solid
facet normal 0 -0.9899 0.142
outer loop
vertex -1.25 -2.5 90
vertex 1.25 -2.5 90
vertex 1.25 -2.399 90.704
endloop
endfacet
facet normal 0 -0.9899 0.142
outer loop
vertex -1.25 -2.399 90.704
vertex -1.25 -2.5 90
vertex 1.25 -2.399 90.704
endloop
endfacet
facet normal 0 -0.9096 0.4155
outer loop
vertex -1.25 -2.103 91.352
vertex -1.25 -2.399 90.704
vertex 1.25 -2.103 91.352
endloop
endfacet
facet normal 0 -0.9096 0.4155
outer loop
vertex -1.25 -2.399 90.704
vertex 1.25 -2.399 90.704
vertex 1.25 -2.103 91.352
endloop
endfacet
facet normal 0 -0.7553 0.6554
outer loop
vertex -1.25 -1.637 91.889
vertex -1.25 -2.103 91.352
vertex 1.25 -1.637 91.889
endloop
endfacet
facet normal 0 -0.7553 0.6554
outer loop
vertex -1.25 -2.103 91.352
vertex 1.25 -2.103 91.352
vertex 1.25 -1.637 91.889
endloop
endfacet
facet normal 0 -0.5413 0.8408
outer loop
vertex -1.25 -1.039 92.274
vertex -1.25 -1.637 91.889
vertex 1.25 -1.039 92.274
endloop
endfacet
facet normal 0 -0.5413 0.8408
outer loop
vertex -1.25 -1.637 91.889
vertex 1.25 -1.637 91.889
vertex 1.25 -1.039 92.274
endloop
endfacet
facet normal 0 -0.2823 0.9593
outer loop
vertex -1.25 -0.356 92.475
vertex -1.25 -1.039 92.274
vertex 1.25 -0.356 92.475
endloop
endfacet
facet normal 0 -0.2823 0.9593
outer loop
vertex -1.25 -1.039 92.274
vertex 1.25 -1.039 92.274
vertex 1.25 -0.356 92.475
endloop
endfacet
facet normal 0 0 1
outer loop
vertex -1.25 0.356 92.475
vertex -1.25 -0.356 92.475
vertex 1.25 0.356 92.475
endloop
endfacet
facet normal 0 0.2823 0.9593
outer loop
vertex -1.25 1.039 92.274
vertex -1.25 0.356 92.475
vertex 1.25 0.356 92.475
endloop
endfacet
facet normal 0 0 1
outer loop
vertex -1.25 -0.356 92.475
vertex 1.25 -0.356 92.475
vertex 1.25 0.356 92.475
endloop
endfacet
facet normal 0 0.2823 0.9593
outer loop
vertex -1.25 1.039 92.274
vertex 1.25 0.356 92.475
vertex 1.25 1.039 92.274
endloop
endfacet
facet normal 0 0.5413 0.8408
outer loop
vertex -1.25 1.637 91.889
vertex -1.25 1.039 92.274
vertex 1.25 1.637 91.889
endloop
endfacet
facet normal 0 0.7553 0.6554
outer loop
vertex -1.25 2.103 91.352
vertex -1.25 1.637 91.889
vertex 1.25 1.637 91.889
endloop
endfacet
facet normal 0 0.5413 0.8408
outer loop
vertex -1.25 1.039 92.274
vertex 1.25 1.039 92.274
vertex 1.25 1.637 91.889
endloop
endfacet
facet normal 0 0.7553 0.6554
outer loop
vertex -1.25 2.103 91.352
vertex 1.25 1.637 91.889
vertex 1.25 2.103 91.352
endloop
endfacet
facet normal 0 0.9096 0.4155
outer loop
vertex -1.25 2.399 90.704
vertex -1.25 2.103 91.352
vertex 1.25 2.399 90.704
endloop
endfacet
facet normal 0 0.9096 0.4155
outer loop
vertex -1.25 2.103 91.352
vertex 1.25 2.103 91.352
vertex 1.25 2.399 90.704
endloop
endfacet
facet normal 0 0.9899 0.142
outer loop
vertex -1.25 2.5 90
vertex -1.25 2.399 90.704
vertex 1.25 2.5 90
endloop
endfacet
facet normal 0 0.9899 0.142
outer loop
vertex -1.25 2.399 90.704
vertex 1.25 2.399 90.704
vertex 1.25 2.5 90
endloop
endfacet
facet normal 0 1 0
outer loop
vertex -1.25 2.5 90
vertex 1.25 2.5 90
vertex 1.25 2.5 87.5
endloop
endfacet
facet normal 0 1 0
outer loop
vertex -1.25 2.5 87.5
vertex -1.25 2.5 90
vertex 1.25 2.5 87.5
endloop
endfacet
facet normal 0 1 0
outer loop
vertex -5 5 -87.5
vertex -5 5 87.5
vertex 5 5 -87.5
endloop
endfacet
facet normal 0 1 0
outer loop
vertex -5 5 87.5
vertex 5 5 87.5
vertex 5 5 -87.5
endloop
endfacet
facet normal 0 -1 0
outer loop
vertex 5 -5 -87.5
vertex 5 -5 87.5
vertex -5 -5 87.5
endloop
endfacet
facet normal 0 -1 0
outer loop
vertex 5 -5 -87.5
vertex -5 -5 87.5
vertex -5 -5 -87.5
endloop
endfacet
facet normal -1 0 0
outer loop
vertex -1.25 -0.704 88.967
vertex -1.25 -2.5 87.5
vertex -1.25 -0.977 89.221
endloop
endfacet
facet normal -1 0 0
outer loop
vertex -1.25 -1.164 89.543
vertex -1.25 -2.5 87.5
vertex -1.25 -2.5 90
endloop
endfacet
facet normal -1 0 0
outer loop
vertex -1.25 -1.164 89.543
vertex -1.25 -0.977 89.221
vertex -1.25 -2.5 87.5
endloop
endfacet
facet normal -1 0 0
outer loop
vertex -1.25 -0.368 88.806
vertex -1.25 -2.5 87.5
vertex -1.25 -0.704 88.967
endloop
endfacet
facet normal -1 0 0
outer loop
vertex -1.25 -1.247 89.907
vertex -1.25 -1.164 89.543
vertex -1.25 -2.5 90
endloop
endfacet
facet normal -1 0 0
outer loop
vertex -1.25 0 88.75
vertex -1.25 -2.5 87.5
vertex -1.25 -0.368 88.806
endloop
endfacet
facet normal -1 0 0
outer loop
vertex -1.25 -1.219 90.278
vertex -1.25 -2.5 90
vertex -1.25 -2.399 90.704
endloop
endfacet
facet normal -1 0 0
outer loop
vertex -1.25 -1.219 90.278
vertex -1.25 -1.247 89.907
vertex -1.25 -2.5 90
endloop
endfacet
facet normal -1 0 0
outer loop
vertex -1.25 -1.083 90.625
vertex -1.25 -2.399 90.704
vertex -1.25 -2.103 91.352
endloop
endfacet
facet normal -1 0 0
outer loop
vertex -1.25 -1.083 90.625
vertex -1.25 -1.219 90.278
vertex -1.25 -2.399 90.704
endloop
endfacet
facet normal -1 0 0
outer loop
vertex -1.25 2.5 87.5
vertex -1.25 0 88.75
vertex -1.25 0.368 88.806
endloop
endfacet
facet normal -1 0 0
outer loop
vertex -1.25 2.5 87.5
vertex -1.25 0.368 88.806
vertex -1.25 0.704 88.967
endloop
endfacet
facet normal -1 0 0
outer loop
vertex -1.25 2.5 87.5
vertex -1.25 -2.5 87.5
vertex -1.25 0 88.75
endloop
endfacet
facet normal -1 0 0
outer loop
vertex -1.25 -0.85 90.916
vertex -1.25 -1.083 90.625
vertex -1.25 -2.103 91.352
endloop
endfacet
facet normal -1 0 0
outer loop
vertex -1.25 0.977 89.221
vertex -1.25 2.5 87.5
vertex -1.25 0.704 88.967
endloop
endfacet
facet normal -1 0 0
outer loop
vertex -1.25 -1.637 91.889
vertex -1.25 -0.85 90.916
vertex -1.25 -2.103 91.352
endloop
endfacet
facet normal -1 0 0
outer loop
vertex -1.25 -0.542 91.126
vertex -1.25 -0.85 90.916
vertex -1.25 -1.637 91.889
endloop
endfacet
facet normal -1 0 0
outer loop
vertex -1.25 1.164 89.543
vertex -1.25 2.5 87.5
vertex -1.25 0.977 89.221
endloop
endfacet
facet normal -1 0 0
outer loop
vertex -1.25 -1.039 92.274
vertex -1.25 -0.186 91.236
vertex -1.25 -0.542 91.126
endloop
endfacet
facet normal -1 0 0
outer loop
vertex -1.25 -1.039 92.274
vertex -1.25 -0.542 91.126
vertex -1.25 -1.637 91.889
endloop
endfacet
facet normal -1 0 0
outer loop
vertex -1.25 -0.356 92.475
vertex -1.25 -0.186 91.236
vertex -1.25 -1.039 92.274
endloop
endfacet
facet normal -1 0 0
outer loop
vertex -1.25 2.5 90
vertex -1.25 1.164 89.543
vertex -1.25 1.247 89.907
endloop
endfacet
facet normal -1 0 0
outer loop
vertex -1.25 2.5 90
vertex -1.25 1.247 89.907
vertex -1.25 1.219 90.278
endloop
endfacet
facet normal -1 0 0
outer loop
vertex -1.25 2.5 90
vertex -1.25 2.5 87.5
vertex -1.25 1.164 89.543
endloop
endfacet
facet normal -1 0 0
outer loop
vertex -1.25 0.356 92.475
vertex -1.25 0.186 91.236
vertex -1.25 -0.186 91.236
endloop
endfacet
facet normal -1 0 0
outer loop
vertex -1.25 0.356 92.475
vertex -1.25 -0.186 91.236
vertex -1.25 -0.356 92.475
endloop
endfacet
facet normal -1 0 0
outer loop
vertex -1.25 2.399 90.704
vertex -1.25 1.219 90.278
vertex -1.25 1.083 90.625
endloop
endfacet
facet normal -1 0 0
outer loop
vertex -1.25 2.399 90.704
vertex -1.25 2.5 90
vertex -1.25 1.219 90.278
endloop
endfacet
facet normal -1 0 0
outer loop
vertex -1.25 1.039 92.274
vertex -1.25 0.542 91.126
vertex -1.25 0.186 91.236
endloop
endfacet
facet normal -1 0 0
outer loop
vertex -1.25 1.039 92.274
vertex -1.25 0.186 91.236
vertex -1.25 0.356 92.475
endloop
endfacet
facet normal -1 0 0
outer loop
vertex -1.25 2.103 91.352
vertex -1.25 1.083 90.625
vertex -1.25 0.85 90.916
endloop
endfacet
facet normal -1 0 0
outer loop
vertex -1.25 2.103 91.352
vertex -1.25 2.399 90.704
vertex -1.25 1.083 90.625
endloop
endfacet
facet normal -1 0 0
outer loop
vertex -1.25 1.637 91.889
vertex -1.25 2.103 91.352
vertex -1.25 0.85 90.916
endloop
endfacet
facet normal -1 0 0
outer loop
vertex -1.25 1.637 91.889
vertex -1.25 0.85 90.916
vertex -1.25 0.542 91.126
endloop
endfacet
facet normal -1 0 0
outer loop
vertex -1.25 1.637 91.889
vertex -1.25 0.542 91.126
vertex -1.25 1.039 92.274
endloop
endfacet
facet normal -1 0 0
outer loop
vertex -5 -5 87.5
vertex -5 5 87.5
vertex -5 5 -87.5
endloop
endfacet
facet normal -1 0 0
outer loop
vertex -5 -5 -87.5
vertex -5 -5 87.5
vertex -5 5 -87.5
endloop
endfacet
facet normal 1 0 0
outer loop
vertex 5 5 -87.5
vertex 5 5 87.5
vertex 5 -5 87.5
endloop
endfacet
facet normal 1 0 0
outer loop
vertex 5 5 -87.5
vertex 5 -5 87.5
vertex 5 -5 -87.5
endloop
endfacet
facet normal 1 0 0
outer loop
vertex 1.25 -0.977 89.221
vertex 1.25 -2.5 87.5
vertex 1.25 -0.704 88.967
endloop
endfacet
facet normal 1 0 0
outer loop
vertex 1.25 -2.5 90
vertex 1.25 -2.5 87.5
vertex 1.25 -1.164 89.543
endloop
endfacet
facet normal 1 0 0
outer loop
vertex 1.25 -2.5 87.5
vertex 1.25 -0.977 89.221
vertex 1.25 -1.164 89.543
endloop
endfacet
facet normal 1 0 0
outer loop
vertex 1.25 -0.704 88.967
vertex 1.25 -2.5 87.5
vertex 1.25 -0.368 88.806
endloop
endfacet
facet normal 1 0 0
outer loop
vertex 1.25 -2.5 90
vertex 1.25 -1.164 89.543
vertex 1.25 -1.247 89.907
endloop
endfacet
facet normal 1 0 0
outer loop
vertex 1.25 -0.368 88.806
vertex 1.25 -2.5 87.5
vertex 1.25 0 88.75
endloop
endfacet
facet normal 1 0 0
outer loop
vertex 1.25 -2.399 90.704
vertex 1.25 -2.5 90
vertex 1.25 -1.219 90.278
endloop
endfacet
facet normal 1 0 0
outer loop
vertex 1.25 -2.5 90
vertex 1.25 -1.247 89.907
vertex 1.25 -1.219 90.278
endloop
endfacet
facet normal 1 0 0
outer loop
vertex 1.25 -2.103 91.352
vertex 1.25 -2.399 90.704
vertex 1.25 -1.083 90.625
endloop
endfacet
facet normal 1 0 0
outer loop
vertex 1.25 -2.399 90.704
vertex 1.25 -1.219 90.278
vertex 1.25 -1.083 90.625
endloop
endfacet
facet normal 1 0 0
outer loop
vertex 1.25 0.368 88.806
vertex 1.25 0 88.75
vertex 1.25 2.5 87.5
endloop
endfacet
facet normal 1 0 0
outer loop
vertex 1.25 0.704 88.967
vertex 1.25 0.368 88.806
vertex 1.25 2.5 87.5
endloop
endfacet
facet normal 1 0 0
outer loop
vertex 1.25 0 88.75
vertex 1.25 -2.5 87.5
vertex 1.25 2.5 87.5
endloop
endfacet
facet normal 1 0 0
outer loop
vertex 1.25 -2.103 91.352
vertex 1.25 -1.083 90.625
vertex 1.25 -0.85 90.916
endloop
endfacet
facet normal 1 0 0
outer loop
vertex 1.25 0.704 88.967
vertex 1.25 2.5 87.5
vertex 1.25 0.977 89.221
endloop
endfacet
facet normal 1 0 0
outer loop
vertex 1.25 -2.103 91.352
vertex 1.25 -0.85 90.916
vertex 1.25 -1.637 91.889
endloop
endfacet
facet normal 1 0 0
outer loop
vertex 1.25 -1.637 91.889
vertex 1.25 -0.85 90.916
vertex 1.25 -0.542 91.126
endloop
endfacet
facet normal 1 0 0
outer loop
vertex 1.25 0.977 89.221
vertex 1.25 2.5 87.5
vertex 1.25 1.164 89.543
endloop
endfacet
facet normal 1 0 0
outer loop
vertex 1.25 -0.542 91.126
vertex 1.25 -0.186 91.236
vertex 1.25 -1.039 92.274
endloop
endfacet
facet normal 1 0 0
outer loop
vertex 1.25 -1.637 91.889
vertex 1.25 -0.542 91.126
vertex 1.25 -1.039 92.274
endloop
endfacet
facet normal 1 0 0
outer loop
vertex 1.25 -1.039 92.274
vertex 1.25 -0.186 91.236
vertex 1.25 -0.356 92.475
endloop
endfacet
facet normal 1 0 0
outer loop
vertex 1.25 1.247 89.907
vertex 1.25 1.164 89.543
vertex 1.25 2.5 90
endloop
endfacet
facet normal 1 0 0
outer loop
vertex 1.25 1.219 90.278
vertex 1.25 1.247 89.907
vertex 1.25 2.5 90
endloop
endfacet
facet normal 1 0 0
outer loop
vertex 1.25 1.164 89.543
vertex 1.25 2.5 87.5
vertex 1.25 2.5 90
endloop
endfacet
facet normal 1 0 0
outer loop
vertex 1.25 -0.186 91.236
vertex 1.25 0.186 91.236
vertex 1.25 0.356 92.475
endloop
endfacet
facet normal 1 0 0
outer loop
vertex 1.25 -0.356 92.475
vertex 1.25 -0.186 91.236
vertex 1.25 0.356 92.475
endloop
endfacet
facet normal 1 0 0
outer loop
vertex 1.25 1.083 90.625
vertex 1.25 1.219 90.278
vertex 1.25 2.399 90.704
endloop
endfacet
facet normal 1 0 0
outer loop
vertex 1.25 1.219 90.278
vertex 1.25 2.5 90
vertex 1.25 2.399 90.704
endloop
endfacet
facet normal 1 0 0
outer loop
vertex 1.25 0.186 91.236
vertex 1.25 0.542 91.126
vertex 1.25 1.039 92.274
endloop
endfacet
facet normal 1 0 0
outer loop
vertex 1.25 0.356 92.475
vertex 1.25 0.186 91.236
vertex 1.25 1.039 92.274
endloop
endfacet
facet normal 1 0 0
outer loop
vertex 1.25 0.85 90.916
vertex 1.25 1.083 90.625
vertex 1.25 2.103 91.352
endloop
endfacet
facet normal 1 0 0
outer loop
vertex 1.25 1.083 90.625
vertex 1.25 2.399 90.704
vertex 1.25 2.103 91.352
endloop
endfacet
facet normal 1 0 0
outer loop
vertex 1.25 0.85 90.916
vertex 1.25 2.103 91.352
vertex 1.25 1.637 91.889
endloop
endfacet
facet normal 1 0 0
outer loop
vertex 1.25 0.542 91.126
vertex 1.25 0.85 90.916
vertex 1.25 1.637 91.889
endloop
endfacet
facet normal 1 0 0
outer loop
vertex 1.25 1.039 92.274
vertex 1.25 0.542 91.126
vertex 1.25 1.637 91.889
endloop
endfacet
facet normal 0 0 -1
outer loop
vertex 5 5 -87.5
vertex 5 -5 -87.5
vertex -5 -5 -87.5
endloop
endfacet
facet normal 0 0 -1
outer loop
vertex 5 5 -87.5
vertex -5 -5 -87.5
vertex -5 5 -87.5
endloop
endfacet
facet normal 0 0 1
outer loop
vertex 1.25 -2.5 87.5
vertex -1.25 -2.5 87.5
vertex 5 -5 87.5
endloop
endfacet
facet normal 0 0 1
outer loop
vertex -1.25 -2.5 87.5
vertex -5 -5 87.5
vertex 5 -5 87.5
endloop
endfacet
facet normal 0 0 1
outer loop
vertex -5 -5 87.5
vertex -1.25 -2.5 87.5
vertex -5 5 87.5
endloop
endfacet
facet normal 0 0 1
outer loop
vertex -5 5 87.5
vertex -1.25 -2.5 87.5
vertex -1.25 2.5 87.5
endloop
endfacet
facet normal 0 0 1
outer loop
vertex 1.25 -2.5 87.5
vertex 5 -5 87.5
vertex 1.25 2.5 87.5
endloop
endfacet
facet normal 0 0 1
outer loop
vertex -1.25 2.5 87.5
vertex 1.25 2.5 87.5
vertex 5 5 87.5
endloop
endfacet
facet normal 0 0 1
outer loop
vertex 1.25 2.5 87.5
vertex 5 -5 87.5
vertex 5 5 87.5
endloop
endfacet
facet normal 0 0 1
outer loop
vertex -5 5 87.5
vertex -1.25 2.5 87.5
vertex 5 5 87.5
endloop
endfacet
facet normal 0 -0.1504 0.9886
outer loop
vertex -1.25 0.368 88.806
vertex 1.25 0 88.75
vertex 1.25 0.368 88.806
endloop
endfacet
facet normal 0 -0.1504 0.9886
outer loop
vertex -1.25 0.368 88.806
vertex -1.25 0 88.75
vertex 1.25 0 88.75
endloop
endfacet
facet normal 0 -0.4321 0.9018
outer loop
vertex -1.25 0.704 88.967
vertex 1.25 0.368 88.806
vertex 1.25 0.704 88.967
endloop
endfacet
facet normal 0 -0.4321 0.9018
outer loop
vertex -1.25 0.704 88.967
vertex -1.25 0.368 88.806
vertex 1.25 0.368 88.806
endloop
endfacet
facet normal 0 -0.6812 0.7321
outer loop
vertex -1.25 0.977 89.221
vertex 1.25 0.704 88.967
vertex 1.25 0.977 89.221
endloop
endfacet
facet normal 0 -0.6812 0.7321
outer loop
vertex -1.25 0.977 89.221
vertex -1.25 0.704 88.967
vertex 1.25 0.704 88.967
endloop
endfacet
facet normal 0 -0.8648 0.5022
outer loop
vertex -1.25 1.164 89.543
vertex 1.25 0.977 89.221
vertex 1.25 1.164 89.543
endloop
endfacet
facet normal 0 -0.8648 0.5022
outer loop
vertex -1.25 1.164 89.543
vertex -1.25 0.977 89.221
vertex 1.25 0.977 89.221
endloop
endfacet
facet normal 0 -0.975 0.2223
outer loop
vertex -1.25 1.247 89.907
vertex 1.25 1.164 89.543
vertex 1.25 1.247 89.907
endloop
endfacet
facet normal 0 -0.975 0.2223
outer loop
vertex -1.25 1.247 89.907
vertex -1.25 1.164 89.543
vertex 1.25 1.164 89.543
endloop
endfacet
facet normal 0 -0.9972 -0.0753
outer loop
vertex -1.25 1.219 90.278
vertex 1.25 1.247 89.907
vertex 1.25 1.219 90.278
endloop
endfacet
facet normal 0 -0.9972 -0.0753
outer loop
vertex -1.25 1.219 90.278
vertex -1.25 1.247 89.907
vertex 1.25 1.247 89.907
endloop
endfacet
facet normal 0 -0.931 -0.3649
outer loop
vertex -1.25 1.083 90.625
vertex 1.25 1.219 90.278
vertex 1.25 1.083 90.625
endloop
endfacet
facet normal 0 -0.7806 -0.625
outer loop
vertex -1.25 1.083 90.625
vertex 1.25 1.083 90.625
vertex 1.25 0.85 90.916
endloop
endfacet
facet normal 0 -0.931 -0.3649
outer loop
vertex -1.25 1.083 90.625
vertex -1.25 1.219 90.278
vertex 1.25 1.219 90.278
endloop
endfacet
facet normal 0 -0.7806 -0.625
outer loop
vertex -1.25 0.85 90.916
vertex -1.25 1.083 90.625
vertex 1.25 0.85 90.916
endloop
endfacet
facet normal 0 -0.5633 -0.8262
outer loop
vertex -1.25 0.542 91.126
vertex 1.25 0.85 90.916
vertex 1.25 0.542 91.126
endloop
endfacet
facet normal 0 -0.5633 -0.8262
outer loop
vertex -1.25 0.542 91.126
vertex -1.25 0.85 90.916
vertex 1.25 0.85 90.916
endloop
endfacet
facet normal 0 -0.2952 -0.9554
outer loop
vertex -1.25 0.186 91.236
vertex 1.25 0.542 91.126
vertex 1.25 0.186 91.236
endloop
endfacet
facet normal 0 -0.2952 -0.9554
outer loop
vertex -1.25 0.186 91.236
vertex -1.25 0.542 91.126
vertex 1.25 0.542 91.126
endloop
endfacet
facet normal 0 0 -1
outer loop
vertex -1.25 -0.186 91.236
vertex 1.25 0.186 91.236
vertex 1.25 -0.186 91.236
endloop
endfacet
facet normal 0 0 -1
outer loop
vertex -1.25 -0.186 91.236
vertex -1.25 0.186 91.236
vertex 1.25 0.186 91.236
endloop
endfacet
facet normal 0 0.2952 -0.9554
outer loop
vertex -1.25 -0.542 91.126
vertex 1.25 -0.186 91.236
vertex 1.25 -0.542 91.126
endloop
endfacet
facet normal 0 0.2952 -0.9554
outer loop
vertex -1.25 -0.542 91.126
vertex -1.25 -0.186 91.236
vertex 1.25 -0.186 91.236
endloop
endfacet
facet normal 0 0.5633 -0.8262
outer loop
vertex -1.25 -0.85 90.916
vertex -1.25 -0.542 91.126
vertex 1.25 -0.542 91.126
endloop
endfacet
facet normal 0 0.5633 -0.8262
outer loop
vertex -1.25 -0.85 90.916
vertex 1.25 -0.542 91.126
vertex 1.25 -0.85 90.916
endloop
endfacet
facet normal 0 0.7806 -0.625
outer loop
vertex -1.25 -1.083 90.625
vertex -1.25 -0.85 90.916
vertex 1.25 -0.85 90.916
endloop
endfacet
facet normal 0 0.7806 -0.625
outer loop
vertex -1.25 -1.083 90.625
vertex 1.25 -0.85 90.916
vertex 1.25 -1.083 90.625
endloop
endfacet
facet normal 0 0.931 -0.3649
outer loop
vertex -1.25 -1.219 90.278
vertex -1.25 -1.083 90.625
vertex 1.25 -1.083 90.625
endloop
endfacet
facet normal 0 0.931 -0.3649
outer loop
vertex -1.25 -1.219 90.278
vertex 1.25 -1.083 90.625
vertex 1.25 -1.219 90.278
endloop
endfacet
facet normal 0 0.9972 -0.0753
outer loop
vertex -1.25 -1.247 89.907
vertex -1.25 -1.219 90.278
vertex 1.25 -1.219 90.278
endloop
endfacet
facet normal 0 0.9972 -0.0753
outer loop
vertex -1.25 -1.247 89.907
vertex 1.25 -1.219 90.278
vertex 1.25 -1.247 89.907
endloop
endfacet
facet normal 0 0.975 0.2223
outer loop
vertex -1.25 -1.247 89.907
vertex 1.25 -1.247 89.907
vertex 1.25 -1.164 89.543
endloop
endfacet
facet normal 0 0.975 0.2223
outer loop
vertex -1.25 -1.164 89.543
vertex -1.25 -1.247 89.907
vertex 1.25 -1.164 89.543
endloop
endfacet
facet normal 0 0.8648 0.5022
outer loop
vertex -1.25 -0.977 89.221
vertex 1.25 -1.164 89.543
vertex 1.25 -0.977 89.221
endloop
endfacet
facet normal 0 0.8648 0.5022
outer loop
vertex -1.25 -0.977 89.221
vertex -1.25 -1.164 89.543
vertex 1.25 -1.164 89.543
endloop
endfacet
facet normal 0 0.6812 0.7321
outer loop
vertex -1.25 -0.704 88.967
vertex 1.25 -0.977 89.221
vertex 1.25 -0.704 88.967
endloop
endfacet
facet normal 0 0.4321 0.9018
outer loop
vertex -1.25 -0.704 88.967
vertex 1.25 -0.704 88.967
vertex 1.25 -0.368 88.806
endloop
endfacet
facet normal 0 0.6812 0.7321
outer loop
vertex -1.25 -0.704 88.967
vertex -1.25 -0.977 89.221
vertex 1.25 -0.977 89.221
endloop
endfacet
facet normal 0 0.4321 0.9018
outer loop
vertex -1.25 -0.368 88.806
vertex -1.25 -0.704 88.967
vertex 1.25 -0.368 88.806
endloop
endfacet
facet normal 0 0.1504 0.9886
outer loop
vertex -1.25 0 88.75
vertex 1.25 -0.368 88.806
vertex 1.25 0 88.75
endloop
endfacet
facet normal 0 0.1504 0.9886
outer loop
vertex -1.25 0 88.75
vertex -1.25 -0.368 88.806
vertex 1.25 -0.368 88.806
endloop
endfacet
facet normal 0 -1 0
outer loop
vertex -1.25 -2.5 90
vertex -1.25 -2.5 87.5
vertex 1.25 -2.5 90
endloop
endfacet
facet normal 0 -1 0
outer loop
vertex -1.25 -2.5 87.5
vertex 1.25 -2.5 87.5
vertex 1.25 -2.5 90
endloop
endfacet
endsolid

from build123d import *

# Parameters (mm, degrees)
SKETCH_2_W      = 175
SKETCH_2_H      = 10
EXTRUDE_1_DEPTH = 5
SKETCH_3_R      = 1.25
EXTRUDE_2_DEPTH = 1.25


with BuildPart() as part:
    # 스케치2 → 보스-돌출1 (new, symmetric)
    with BuildSketch(Plane(origin=(0, 0, 0), x_dir=(0, 0, -1), z_dir=(1, 0, 0))):
        Rectangle(SKETCH_2_W, SKETCH_2_H)
    extrude(amount=EXTRUDE_1_DEPTH, both=True)

    # 스케치3 → 보스-돌출2 (add, symmetric)
    with BuildSketch(Plane(origin=(0, 0, 0), x_dir=(0, 0, -1), z_dir=(1, 0, 0))):
        with BuildLine():
            Line((-90, 2.5), (-87.5, 2.5))
            Line((-87.5, 2.5), (-87.5, -2.5))
            Line((-87.5, -2.5), (-90, -2.5))
            ThreePointArc((-90, -2.5), (-92.5, 0), (-90, 2.5))
        make_face()
        with Locations((-90, 0)):
            Circle(SKETCH_3_R, mode=Mode.SUBTRACT)
    extrude(amount=EXTRUDE_2_DEPTH, both=True)


solid = part.part
